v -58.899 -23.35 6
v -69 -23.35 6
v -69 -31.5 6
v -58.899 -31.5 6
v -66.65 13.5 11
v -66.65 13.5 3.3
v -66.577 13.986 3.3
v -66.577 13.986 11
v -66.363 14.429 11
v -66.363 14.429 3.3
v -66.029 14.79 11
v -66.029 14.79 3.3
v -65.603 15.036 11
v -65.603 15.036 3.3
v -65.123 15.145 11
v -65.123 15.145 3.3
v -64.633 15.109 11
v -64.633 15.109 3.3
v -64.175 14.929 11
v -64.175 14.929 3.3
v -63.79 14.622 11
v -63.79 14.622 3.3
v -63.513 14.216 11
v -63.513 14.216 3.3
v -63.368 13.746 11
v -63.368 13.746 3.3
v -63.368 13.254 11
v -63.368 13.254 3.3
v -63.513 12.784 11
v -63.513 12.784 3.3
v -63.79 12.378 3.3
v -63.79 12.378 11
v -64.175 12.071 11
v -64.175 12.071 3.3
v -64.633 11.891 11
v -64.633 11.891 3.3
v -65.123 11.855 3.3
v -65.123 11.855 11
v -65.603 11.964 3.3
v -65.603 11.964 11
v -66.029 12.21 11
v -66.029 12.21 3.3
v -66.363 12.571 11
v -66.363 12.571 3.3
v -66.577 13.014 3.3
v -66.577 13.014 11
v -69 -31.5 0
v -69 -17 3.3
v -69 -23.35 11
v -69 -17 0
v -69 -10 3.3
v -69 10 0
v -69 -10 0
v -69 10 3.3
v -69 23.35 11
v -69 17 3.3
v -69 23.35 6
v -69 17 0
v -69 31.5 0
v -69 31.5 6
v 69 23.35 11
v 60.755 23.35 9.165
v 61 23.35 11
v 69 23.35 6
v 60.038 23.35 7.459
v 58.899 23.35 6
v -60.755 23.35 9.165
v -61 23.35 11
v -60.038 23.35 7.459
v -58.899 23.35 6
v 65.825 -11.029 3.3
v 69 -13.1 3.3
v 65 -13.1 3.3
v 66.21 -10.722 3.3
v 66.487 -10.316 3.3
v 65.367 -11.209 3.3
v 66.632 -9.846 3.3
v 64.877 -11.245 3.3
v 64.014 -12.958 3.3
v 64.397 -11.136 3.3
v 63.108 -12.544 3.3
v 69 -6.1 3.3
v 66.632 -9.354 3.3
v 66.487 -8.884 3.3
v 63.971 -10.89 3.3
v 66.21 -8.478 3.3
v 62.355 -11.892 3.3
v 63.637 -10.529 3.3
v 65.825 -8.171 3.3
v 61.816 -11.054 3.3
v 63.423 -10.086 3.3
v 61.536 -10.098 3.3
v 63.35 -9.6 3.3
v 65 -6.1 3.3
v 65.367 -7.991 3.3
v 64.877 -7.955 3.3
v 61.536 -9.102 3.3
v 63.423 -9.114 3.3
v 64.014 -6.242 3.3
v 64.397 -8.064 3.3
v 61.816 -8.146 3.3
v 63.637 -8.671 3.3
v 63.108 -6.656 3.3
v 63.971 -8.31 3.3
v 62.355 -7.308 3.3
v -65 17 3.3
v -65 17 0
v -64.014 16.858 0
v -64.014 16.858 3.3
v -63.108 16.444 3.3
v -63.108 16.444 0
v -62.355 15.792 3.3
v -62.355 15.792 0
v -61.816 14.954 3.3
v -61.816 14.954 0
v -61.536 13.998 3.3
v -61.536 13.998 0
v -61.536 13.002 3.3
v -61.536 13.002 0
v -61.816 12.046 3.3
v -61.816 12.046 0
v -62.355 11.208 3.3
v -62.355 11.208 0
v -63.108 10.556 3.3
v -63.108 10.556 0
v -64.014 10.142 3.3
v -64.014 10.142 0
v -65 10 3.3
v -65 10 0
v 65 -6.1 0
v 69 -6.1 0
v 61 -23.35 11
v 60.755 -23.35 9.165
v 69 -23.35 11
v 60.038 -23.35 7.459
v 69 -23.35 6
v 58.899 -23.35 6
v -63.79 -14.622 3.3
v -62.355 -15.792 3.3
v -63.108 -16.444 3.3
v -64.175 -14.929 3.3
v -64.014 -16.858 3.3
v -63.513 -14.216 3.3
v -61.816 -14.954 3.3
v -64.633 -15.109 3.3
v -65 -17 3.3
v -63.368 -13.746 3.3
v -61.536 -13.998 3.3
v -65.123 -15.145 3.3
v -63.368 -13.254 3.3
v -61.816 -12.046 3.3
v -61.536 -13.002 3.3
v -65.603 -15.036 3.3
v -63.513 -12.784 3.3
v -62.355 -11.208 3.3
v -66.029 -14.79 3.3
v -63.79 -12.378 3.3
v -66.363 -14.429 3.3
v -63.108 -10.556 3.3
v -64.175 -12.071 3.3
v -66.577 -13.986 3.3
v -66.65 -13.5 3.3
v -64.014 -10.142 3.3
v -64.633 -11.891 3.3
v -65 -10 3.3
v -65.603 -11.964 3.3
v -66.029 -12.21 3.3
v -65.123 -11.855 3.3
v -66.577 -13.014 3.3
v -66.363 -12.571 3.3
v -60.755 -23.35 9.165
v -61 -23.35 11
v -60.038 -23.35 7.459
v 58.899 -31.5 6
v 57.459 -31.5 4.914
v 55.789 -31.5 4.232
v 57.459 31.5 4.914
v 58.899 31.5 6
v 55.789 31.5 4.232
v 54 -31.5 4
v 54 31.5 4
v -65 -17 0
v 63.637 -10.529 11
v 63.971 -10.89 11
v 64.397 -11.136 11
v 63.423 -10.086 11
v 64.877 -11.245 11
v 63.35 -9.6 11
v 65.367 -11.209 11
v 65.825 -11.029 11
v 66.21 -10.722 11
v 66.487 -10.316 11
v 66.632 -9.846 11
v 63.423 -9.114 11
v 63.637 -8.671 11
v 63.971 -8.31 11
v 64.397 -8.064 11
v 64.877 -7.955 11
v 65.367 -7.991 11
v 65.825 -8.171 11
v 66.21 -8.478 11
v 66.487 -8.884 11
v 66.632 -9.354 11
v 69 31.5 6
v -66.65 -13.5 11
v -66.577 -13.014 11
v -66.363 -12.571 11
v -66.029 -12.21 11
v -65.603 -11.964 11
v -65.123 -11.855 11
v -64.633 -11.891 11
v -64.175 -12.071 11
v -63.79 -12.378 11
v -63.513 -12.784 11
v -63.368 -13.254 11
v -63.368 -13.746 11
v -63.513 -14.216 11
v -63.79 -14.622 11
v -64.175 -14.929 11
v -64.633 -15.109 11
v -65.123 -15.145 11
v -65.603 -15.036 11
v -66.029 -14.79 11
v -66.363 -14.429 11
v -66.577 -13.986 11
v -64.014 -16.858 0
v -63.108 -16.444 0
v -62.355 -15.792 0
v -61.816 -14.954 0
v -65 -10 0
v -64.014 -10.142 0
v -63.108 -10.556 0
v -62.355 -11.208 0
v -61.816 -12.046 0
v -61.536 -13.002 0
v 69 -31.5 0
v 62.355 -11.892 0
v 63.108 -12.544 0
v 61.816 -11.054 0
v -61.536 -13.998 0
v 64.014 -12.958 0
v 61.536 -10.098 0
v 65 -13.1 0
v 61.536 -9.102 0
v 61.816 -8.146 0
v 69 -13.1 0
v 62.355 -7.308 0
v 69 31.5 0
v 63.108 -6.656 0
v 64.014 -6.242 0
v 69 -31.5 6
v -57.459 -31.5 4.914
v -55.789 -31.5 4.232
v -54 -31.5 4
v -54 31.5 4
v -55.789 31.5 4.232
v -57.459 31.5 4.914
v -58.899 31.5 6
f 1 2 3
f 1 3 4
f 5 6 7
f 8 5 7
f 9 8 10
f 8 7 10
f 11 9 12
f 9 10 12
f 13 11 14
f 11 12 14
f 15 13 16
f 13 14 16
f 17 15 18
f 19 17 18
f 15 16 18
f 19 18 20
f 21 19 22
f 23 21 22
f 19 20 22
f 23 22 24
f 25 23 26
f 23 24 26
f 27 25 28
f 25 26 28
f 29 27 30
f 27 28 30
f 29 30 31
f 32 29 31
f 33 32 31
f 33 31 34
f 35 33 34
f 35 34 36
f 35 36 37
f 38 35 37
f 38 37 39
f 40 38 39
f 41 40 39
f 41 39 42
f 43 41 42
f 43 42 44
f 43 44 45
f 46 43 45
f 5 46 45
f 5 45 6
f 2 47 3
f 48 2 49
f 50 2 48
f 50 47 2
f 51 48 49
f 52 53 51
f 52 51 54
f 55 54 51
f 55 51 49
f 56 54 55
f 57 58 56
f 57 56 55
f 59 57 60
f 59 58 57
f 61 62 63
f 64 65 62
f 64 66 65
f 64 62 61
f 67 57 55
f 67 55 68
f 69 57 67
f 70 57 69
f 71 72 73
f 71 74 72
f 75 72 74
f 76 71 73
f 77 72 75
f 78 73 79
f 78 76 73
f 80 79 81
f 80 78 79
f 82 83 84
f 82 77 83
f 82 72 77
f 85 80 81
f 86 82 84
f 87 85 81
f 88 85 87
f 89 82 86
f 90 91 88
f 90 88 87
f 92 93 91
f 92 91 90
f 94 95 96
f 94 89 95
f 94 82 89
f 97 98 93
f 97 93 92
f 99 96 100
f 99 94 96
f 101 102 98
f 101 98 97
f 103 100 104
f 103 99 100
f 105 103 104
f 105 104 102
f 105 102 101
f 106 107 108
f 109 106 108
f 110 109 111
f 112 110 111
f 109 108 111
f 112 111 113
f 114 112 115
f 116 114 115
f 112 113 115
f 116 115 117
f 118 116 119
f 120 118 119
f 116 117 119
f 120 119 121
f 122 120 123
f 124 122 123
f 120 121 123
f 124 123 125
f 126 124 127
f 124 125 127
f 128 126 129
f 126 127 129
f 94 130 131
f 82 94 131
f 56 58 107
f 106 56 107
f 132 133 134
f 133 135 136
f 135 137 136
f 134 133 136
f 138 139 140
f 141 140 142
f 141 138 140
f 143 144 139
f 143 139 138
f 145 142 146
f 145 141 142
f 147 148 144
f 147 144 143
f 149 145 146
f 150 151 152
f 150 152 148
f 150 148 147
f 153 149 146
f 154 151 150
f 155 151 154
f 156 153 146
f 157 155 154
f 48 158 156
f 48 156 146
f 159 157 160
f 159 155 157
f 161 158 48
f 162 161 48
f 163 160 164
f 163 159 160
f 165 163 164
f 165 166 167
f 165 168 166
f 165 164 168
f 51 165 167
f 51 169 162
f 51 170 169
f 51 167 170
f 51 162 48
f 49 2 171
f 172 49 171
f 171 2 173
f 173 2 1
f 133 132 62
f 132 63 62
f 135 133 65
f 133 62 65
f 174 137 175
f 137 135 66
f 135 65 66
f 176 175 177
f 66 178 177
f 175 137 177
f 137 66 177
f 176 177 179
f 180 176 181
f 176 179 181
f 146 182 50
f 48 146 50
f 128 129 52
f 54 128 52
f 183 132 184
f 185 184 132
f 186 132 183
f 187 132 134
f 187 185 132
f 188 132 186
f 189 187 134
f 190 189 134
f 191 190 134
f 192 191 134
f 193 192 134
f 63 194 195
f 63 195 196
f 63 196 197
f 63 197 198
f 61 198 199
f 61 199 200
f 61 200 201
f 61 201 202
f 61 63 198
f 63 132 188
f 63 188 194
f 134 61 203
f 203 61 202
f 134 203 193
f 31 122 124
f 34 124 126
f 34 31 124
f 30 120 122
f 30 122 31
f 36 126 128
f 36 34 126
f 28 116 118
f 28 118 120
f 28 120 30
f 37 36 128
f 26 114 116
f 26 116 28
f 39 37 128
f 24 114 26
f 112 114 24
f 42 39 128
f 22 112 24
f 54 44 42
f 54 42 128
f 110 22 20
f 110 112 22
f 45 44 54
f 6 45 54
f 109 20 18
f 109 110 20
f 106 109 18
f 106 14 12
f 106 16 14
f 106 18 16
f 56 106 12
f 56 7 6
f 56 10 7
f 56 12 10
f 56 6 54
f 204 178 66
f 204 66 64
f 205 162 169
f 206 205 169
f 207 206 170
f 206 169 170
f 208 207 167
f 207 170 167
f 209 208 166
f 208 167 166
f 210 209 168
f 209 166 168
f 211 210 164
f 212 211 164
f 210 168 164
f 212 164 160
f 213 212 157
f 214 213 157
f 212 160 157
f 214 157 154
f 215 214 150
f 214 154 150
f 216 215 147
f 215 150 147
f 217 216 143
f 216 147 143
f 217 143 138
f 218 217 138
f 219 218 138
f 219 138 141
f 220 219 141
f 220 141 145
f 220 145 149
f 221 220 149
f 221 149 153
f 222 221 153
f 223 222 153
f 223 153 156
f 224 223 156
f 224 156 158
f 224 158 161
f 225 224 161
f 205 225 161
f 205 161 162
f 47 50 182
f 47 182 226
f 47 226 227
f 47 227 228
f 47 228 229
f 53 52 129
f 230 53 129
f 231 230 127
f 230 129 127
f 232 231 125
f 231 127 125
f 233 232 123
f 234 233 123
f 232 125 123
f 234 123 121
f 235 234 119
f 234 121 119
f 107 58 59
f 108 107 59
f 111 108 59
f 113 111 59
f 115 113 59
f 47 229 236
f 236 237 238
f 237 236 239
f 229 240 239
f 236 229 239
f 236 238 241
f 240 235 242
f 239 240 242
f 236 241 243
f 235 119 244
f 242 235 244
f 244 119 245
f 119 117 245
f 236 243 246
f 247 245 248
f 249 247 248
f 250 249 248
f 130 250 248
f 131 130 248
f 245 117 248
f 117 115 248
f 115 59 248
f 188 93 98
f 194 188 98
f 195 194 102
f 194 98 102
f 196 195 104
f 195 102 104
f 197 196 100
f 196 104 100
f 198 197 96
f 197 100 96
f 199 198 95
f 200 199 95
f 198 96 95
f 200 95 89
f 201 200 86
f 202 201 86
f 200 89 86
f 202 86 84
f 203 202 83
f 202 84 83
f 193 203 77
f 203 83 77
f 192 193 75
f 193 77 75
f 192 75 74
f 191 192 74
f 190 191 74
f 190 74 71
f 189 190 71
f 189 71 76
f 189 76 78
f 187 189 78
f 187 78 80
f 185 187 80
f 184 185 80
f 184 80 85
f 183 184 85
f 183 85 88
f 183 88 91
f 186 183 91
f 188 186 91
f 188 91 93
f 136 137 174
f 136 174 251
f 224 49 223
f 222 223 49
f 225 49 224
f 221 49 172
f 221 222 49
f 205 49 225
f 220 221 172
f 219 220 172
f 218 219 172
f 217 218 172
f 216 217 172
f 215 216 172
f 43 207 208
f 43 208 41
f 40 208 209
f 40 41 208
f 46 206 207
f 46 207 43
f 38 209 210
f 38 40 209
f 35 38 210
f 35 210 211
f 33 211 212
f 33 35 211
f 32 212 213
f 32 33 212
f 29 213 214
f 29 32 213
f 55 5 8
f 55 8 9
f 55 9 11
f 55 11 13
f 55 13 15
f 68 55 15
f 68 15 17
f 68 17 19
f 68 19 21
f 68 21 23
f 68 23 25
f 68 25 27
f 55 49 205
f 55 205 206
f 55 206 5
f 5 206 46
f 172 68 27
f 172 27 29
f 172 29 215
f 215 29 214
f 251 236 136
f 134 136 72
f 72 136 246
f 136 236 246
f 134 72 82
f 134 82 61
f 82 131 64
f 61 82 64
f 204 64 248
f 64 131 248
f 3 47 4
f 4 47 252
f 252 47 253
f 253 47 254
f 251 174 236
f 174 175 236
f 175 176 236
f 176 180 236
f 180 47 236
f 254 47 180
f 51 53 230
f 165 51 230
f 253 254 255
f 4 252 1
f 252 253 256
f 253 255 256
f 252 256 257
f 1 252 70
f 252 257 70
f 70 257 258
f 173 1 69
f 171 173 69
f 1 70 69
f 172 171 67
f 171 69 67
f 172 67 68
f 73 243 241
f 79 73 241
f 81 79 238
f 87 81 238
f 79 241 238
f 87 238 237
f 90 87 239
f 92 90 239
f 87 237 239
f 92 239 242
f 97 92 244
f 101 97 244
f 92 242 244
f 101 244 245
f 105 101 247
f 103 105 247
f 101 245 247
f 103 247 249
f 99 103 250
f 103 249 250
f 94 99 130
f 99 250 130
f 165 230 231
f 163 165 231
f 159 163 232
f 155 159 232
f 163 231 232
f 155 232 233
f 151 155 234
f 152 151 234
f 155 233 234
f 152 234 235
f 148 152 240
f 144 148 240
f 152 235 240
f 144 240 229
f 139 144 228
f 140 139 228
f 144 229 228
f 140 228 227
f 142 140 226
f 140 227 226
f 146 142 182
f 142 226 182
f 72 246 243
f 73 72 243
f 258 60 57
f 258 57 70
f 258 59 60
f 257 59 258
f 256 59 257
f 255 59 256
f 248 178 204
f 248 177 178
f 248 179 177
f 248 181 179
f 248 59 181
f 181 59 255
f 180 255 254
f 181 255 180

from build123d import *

# Parameters (mm, degrees)
ESBO_O1_W                = 138
ESBO_O1_H                = 63
RESSALTO_EXTRUS_O1_DEPTH = 4
ESBO_O2_W                = 8
ESBO_O2_H                = 63
RESSALTO_EXTRUS_O2_DEPTH = 2
ESBO_O3_W                = 8
ESBO_O3_H                = 46.7
RESSALTO_EXTRUS_O3_DEPTH = 5
ESBO_O4_R                = 1.65
CORTE_EXTRUS_O1_DEPTH    = 77.643655967
CORTE_EXTRUS_O2_DEPTH    = 3.3
FILETE1_R                = 7


with BuildPart() as part:
    # Esboço1 → Ressalto-extrusão1 (new body)
    with BuildSketch(Plane.XY):
        Rectangle(ESBO_O1_W, ESBO_O1_H)
    extrude(amount=RESSALTO_EXTRUS_O1_DEPTH)

    # Esboço2 → Ressalto-extrusão2 (add)
    with BuildSketch(Plane.XY.offset(4)):
        with Locations((65, 0)):
            Rectangle(ESBO_O2_W, ESBO_O2_H)
        with Locations((-65, 0)):
            Rectangle(ESBO_O2_W, ESBO_O2_H)
    extrude(amount=RESSALTO_EXTRUS_O2_DEPTH)

    # Esboço3 → Ressalto-extrusão3 (add)
    with BuildSketch(Plane.XY.offset(6)):
        with Locations((65, 0)):
            Rectangle(ESBO_O3_W, ESBO_O3_H)
        with Locations((-65, 0)):
            Rectangle(ESBO_O3_W, ESBO_O3_H)
    extrude(amount=RESSALTO_EXTRUS_O3_DEPTH)

    # Esboço4 → Corte-extrusão1 (cut, through all)
    with BuildSketch(Plane(origin=(0, 0, 0), x_dir=(-1, 0, 0), z_dir=(0, 0, -1))):
        with Locations((65, -13.5)):
            Circle(ESBO_O4_R)
        with Locations((65, 13.5)):
            Circle(ESBO_O4_R)
        with Locations((-65, -9.6)):
            Circle(ESBO_O4_R)
    extrude(amount=-CORTE_EXTRUS_O1_DEPTH, mode=Mode.SUBTRACT)

    # Esboço5 → Corte-extrusão2 (cut)
    with BuildSketch(Plane(origin=(0, 0, 0), x_dir=(-1, 0, 0), z_dir=(0, 0, -1))):
        with BuildLine():
            Line((65, -17), (69, -17))
            Line((69, -17), (69, -10))
            Line((69, -10), (65, -10))
            ThreePointArc((65, -10), (61.5, -13.5), (65, -17))
        make_face()
        with BuildLine():
            Line((65, 10), (69, 10))
            Line((69, 10), (69.148700963, 17))
            Line((69.148700963, 17), (65, 17))
            ThreePointArc((65, 17), (61.5, 13.5), (65, 10))
        make_face()
        with BuildLine():
            Line((-65, -6.1), (-69, -6.1))
            Line((-69, -6.1), (-69, -13.1))
            Line((-69, -13.1), (-65, -13.1))
            ThreePointArc((-65, -13.1), (-61.5, -9.6), (-65, -6.1))
        make_face()
    extrude(amount=-CORTE_EXTRUS_O2_DEPTH, mode=Mode.SUBTRACT)

    # Filete1
    filete1_edges = [part.edges().sort_by_distance(p)[0] for p in [
        (61, 0, 4),
        (-61, 0, 4),
    ]]
    fillet(filete1_edges, radius=FILETE1_R - 0.0001)  # a hair under: the kernel refuses the full size


solid = part.part
